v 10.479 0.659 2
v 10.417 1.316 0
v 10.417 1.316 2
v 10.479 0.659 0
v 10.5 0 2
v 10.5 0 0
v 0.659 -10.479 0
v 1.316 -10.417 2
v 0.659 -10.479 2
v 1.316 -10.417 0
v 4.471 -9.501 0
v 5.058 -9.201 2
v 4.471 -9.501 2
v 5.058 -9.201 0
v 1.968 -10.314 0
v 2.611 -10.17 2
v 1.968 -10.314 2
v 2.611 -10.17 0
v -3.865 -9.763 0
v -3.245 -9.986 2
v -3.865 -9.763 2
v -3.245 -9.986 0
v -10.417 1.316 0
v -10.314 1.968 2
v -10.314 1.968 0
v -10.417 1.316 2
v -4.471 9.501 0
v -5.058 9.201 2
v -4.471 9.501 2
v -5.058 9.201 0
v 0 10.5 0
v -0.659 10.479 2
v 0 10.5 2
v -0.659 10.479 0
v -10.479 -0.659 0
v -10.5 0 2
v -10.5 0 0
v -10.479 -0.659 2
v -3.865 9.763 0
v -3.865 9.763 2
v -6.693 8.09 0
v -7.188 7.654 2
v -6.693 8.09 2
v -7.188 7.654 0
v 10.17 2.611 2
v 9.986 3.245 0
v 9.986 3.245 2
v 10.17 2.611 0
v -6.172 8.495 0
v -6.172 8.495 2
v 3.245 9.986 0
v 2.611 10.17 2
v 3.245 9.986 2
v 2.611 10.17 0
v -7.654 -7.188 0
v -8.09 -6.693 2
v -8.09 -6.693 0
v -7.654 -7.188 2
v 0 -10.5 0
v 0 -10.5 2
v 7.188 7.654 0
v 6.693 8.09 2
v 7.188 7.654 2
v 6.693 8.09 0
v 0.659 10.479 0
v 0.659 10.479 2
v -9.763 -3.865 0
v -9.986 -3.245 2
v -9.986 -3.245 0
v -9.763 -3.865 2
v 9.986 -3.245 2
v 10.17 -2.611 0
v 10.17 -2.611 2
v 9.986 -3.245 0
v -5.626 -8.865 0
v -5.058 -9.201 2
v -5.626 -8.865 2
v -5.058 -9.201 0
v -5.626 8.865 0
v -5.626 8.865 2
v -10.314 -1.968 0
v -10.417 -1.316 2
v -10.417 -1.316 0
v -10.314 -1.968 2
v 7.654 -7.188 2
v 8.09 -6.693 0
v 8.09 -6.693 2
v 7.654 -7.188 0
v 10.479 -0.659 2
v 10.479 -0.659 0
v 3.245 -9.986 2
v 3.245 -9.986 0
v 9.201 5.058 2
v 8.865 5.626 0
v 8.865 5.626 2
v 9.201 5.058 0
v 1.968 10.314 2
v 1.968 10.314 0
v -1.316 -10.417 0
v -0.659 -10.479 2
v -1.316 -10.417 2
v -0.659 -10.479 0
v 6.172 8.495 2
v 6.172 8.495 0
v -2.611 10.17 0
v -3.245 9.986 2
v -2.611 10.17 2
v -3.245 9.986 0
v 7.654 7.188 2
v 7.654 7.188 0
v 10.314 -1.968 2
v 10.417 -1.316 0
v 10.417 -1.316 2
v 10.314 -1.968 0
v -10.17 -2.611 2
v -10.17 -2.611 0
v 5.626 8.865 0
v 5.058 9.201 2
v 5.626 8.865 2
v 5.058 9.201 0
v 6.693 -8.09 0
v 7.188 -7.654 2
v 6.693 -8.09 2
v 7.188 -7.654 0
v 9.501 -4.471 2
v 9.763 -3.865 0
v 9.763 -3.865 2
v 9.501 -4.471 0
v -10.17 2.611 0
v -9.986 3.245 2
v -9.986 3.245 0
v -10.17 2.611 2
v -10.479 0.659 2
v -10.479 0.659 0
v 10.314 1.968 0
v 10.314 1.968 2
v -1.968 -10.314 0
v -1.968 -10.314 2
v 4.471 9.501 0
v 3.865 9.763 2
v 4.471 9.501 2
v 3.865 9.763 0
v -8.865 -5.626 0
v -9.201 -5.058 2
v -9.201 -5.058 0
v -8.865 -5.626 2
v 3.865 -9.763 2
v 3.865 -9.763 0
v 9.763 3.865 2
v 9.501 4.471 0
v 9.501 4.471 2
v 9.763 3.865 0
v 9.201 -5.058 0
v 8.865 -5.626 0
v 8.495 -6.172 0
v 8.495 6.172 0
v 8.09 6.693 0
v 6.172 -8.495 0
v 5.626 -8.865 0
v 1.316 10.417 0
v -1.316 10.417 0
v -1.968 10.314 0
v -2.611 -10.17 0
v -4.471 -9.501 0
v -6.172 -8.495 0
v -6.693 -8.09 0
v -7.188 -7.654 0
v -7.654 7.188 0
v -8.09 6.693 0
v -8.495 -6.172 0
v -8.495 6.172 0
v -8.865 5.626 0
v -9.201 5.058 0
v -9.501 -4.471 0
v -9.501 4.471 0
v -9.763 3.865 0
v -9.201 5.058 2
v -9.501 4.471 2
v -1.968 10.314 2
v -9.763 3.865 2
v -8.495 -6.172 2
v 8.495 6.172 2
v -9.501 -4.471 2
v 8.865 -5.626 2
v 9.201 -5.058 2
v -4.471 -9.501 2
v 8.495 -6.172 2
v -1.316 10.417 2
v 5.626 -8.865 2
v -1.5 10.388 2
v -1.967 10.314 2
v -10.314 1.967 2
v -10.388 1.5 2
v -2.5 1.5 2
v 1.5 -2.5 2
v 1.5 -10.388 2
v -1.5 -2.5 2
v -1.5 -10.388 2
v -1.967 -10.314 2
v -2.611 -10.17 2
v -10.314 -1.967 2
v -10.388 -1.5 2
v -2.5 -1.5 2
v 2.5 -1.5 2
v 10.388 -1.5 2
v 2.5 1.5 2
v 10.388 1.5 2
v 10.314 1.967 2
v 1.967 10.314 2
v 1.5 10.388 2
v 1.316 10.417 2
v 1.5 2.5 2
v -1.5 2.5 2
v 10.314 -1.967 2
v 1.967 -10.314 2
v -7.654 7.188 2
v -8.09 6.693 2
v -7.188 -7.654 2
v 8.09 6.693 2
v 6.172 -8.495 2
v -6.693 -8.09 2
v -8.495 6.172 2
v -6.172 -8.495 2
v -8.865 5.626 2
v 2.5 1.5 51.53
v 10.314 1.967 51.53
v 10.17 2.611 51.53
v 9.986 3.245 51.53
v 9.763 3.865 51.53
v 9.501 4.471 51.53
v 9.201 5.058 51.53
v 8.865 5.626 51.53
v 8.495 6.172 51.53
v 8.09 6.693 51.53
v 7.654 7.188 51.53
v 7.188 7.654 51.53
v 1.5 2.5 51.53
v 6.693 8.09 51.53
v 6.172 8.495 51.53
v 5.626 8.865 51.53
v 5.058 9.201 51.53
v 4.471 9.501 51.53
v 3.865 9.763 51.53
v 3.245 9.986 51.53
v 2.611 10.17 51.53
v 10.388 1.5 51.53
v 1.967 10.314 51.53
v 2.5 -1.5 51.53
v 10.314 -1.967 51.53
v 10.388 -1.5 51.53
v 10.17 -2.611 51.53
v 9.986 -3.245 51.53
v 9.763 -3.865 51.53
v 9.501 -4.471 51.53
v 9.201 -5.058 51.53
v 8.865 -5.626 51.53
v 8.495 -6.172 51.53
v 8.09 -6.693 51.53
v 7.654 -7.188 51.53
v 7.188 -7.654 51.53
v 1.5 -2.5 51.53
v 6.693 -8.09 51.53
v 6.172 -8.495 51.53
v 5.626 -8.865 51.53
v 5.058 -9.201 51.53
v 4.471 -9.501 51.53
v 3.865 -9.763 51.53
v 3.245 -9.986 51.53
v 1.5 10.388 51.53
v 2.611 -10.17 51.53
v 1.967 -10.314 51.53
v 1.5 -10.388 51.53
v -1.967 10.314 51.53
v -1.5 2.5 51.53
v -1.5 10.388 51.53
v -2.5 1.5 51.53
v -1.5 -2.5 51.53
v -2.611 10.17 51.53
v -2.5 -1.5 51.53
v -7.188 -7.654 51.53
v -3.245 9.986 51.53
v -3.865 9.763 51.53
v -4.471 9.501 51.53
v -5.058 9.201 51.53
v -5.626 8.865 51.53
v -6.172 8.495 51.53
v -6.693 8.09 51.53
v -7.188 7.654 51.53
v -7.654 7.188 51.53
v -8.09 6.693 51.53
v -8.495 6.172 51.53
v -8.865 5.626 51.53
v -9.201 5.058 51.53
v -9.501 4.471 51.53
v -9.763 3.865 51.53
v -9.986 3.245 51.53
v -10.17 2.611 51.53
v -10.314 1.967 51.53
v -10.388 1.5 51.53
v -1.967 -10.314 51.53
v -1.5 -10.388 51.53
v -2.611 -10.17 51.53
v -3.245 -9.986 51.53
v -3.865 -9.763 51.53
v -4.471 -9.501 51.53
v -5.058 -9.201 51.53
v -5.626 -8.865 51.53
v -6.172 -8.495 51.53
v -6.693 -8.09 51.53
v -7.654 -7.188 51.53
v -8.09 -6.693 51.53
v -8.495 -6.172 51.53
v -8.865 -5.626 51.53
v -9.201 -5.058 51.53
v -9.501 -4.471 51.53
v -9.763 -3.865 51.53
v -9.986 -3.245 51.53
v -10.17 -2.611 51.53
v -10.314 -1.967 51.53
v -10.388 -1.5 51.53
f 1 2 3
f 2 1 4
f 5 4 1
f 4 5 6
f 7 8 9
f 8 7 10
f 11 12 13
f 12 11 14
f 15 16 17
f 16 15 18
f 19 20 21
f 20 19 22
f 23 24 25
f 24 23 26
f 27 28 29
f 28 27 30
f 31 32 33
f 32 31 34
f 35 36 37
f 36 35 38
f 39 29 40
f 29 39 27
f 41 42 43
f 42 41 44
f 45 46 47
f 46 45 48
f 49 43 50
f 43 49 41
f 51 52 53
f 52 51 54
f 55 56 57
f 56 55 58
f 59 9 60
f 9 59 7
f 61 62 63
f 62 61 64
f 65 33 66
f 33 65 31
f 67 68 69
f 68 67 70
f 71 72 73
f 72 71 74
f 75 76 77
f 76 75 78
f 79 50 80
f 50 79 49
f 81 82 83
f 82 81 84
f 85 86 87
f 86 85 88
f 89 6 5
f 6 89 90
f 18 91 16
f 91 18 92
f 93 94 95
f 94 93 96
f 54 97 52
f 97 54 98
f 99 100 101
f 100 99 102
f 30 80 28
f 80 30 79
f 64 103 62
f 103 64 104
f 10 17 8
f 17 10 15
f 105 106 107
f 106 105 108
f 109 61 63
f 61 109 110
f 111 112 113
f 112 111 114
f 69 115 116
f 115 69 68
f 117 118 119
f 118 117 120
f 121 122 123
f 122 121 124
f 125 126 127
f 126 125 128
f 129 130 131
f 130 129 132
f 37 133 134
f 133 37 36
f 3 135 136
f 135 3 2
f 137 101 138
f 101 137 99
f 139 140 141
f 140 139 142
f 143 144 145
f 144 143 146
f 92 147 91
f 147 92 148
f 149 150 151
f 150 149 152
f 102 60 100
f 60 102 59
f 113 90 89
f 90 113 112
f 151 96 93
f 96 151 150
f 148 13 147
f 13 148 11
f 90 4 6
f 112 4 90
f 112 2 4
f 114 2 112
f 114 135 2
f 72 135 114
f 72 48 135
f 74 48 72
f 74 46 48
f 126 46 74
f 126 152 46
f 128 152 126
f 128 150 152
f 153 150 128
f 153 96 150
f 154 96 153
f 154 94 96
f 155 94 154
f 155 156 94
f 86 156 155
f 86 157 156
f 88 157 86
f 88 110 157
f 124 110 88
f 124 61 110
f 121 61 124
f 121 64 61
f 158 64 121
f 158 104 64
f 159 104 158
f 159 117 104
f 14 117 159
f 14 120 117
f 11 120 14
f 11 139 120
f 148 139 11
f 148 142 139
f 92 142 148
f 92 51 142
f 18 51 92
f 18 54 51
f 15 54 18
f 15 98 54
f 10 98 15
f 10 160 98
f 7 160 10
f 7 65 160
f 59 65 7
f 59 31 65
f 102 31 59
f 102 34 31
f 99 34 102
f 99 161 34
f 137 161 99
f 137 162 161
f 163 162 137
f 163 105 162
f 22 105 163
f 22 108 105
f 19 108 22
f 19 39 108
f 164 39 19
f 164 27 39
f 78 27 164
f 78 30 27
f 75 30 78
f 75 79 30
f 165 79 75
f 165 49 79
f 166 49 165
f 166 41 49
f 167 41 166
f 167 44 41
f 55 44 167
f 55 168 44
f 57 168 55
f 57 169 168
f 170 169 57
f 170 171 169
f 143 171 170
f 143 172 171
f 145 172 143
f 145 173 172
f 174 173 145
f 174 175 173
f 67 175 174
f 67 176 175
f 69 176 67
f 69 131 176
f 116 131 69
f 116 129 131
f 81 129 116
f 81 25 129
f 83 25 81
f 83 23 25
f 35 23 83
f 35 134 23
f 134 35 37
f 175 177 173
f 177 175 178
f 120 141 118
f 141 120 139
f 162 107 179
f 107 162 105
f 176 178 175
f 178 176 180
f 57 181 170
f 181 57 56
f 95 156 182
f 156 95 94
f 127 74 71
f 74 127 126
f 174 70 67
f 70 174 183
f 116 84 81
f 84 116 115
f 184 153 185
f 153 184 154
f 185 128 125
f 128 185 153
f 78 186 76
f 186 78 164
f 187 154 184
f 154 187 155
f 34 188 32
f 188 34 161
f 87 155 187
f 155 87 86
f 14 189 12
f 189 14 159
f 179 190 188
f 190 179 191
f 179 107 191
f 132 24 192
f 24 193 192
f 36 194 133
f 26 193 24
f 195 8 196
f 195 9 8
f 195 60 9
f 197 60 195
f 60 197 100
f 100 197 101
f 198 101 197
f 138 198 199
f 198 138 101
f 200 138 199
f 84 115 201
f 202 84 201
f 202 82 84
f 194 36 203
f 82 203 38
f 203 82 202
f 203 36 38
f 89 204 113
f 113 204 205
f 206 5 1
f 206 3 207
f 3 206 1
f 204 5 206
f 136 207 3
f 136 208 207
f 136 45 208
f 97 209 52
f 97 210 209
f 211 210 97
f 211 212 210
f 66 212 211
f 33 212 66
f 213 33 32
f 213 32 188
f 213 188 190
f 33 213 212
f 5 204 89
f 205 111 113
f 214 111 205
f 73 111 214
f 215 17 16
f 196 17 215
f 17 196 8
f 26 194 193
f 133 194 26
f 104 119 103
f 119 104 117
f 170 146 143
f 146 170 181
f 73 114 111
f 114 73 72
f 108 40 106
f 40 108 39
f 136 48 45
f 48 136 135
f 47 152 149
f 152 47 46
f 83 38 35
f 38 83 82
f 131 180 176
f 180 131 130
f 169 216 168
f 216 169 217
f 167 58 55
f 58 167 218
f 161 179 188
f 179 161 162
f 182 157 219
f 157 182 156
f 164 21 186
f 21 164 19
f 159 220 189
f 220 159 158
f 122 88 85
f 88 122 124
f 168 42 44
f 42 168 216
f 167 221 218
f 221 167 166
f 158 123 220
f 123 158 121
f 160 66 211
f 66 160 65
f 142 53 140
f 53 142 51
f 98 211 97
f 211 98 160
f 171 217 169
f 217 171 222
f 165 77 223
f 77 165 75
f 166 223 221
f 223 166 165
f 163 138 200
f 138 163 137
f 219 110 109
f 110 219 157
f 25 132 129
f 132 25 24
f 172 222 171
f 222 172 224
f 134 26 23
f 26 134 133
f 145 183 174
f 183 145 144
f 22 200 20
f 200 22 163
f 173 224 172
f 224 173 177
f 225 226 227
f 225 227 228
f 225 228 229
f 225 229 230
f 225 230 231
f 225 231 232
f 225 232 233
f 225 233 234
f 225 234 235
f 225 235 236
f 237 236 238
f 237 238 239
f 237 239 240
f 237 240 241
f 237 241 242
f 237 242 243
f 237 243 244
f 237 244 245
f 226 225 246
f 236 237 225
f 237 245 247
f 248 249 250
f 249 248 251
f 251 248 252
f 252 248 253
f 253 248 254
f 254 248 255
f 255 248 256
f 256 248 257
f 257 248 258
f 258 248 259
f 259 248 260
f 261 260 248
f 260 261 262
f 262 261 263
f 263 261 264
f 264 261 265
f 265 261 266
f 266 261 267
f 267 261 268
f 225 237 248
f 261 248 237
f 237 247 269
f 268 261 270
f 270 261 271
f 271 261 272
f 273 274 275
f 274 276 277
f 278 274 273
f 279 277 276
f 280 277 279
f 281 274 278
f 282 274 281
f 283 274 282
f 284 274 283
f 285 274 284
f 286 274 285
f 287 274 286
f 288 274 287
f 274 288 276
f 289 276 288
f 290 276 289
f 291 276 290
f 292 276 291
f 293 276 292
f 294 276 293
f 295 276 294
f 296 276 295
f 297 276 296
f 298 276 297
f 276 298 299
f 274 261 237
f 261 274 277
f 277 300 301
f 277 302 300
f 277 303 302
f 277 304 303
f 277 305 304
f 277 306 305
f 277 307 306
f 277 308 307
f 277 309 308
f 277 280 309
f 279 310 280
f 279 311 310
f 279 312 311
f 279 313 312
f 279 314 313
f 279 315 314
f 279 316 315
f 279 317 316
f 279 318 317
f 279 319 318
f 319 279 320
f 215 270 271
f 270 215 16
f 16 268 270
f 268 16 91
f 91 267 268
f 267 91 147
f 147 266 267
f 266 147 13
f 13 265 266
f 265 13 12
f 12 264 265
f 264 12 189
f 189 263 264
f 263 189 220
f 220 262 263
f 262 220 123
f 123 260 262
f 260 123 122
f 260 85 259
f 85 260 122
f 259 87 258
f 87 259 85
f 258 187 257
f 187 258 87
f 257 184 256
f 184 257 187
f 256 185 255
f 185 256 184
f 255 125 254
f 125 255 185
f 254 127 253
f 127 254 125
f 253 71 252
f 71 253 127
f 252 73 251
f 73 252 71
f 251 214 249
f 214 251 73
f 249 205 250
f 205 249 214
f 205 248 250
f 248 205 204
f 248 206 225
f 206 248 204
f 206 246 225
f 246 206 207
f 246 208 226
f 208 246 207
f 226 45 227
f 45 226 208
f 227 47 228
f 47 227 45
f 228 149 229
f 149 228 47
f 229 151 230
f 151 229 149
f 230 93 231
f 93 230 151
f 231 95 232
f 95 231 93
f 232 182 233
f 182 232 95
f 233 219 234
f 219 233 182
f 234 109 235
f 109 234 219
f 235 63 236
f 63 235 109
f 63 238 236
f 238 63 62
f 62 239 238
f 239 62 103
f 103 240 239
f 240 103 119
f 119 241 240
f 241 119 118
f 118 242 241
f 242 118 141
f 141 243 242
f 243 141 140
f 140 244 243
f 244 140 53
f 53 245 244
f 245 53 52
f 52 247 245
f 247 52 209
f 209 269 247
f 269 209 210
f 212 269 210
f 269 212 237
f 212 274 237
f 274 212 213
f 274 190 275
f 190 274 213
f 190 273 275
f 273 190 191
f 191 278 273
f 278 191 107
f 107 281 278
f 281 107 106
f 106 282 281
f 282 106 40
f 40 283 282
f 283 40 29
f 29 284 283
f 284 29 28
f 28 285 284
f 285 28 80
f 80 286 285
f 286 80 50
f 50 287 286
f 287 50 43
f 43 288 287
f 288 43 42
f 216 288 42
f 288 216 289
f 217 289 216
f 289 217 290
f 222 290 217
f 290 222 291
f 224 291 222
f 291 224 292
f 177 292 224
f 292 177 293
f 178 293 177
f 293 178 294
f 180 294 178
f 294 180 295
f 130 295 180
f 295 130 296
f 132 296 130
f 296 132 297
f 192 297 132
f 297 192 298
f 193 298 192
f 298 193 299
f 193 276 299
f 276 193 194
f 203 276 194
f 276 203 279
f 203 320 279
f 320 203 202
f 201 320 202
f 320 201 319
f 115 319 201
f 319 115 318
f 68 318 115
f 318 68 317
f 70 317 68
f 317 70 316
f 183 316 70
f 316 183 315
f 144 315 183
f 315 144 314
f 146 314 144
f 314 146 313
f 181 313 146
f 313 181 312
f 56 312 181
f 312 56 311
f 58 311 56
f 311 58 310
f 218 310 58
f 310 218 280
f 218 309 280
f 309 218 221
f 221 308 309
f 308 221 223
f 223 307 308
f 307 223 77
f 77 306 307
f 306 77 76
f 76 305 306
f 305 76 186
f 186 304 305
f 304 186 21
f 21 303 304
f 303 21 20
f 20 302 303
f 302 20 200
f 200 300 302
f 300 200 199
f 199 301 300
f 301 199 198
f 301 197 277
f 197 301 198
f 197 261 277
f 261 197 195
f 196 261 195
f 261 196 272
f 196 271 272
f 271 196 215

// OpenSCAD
$fn=100;
side_len = 5+ 2*8;
wall_th = 3;
wall_h = 25.4*2;
connector_minth = 3;
cylinder(r=side_len/2, h=2);
// translate([0,0,55])
//cylinder(r=5/2, h=1, $fn=20);
translate([0,0,2])
linear_extrude(25.4 * 1.95)
difference(){
    circle(r=side_len/2);
    for (i=[0:3]) {
        rotate([0,0,360/4*i])
        translate([5/2, wall_th/-2,0])
        square([8, wall_th]);
    }
}
